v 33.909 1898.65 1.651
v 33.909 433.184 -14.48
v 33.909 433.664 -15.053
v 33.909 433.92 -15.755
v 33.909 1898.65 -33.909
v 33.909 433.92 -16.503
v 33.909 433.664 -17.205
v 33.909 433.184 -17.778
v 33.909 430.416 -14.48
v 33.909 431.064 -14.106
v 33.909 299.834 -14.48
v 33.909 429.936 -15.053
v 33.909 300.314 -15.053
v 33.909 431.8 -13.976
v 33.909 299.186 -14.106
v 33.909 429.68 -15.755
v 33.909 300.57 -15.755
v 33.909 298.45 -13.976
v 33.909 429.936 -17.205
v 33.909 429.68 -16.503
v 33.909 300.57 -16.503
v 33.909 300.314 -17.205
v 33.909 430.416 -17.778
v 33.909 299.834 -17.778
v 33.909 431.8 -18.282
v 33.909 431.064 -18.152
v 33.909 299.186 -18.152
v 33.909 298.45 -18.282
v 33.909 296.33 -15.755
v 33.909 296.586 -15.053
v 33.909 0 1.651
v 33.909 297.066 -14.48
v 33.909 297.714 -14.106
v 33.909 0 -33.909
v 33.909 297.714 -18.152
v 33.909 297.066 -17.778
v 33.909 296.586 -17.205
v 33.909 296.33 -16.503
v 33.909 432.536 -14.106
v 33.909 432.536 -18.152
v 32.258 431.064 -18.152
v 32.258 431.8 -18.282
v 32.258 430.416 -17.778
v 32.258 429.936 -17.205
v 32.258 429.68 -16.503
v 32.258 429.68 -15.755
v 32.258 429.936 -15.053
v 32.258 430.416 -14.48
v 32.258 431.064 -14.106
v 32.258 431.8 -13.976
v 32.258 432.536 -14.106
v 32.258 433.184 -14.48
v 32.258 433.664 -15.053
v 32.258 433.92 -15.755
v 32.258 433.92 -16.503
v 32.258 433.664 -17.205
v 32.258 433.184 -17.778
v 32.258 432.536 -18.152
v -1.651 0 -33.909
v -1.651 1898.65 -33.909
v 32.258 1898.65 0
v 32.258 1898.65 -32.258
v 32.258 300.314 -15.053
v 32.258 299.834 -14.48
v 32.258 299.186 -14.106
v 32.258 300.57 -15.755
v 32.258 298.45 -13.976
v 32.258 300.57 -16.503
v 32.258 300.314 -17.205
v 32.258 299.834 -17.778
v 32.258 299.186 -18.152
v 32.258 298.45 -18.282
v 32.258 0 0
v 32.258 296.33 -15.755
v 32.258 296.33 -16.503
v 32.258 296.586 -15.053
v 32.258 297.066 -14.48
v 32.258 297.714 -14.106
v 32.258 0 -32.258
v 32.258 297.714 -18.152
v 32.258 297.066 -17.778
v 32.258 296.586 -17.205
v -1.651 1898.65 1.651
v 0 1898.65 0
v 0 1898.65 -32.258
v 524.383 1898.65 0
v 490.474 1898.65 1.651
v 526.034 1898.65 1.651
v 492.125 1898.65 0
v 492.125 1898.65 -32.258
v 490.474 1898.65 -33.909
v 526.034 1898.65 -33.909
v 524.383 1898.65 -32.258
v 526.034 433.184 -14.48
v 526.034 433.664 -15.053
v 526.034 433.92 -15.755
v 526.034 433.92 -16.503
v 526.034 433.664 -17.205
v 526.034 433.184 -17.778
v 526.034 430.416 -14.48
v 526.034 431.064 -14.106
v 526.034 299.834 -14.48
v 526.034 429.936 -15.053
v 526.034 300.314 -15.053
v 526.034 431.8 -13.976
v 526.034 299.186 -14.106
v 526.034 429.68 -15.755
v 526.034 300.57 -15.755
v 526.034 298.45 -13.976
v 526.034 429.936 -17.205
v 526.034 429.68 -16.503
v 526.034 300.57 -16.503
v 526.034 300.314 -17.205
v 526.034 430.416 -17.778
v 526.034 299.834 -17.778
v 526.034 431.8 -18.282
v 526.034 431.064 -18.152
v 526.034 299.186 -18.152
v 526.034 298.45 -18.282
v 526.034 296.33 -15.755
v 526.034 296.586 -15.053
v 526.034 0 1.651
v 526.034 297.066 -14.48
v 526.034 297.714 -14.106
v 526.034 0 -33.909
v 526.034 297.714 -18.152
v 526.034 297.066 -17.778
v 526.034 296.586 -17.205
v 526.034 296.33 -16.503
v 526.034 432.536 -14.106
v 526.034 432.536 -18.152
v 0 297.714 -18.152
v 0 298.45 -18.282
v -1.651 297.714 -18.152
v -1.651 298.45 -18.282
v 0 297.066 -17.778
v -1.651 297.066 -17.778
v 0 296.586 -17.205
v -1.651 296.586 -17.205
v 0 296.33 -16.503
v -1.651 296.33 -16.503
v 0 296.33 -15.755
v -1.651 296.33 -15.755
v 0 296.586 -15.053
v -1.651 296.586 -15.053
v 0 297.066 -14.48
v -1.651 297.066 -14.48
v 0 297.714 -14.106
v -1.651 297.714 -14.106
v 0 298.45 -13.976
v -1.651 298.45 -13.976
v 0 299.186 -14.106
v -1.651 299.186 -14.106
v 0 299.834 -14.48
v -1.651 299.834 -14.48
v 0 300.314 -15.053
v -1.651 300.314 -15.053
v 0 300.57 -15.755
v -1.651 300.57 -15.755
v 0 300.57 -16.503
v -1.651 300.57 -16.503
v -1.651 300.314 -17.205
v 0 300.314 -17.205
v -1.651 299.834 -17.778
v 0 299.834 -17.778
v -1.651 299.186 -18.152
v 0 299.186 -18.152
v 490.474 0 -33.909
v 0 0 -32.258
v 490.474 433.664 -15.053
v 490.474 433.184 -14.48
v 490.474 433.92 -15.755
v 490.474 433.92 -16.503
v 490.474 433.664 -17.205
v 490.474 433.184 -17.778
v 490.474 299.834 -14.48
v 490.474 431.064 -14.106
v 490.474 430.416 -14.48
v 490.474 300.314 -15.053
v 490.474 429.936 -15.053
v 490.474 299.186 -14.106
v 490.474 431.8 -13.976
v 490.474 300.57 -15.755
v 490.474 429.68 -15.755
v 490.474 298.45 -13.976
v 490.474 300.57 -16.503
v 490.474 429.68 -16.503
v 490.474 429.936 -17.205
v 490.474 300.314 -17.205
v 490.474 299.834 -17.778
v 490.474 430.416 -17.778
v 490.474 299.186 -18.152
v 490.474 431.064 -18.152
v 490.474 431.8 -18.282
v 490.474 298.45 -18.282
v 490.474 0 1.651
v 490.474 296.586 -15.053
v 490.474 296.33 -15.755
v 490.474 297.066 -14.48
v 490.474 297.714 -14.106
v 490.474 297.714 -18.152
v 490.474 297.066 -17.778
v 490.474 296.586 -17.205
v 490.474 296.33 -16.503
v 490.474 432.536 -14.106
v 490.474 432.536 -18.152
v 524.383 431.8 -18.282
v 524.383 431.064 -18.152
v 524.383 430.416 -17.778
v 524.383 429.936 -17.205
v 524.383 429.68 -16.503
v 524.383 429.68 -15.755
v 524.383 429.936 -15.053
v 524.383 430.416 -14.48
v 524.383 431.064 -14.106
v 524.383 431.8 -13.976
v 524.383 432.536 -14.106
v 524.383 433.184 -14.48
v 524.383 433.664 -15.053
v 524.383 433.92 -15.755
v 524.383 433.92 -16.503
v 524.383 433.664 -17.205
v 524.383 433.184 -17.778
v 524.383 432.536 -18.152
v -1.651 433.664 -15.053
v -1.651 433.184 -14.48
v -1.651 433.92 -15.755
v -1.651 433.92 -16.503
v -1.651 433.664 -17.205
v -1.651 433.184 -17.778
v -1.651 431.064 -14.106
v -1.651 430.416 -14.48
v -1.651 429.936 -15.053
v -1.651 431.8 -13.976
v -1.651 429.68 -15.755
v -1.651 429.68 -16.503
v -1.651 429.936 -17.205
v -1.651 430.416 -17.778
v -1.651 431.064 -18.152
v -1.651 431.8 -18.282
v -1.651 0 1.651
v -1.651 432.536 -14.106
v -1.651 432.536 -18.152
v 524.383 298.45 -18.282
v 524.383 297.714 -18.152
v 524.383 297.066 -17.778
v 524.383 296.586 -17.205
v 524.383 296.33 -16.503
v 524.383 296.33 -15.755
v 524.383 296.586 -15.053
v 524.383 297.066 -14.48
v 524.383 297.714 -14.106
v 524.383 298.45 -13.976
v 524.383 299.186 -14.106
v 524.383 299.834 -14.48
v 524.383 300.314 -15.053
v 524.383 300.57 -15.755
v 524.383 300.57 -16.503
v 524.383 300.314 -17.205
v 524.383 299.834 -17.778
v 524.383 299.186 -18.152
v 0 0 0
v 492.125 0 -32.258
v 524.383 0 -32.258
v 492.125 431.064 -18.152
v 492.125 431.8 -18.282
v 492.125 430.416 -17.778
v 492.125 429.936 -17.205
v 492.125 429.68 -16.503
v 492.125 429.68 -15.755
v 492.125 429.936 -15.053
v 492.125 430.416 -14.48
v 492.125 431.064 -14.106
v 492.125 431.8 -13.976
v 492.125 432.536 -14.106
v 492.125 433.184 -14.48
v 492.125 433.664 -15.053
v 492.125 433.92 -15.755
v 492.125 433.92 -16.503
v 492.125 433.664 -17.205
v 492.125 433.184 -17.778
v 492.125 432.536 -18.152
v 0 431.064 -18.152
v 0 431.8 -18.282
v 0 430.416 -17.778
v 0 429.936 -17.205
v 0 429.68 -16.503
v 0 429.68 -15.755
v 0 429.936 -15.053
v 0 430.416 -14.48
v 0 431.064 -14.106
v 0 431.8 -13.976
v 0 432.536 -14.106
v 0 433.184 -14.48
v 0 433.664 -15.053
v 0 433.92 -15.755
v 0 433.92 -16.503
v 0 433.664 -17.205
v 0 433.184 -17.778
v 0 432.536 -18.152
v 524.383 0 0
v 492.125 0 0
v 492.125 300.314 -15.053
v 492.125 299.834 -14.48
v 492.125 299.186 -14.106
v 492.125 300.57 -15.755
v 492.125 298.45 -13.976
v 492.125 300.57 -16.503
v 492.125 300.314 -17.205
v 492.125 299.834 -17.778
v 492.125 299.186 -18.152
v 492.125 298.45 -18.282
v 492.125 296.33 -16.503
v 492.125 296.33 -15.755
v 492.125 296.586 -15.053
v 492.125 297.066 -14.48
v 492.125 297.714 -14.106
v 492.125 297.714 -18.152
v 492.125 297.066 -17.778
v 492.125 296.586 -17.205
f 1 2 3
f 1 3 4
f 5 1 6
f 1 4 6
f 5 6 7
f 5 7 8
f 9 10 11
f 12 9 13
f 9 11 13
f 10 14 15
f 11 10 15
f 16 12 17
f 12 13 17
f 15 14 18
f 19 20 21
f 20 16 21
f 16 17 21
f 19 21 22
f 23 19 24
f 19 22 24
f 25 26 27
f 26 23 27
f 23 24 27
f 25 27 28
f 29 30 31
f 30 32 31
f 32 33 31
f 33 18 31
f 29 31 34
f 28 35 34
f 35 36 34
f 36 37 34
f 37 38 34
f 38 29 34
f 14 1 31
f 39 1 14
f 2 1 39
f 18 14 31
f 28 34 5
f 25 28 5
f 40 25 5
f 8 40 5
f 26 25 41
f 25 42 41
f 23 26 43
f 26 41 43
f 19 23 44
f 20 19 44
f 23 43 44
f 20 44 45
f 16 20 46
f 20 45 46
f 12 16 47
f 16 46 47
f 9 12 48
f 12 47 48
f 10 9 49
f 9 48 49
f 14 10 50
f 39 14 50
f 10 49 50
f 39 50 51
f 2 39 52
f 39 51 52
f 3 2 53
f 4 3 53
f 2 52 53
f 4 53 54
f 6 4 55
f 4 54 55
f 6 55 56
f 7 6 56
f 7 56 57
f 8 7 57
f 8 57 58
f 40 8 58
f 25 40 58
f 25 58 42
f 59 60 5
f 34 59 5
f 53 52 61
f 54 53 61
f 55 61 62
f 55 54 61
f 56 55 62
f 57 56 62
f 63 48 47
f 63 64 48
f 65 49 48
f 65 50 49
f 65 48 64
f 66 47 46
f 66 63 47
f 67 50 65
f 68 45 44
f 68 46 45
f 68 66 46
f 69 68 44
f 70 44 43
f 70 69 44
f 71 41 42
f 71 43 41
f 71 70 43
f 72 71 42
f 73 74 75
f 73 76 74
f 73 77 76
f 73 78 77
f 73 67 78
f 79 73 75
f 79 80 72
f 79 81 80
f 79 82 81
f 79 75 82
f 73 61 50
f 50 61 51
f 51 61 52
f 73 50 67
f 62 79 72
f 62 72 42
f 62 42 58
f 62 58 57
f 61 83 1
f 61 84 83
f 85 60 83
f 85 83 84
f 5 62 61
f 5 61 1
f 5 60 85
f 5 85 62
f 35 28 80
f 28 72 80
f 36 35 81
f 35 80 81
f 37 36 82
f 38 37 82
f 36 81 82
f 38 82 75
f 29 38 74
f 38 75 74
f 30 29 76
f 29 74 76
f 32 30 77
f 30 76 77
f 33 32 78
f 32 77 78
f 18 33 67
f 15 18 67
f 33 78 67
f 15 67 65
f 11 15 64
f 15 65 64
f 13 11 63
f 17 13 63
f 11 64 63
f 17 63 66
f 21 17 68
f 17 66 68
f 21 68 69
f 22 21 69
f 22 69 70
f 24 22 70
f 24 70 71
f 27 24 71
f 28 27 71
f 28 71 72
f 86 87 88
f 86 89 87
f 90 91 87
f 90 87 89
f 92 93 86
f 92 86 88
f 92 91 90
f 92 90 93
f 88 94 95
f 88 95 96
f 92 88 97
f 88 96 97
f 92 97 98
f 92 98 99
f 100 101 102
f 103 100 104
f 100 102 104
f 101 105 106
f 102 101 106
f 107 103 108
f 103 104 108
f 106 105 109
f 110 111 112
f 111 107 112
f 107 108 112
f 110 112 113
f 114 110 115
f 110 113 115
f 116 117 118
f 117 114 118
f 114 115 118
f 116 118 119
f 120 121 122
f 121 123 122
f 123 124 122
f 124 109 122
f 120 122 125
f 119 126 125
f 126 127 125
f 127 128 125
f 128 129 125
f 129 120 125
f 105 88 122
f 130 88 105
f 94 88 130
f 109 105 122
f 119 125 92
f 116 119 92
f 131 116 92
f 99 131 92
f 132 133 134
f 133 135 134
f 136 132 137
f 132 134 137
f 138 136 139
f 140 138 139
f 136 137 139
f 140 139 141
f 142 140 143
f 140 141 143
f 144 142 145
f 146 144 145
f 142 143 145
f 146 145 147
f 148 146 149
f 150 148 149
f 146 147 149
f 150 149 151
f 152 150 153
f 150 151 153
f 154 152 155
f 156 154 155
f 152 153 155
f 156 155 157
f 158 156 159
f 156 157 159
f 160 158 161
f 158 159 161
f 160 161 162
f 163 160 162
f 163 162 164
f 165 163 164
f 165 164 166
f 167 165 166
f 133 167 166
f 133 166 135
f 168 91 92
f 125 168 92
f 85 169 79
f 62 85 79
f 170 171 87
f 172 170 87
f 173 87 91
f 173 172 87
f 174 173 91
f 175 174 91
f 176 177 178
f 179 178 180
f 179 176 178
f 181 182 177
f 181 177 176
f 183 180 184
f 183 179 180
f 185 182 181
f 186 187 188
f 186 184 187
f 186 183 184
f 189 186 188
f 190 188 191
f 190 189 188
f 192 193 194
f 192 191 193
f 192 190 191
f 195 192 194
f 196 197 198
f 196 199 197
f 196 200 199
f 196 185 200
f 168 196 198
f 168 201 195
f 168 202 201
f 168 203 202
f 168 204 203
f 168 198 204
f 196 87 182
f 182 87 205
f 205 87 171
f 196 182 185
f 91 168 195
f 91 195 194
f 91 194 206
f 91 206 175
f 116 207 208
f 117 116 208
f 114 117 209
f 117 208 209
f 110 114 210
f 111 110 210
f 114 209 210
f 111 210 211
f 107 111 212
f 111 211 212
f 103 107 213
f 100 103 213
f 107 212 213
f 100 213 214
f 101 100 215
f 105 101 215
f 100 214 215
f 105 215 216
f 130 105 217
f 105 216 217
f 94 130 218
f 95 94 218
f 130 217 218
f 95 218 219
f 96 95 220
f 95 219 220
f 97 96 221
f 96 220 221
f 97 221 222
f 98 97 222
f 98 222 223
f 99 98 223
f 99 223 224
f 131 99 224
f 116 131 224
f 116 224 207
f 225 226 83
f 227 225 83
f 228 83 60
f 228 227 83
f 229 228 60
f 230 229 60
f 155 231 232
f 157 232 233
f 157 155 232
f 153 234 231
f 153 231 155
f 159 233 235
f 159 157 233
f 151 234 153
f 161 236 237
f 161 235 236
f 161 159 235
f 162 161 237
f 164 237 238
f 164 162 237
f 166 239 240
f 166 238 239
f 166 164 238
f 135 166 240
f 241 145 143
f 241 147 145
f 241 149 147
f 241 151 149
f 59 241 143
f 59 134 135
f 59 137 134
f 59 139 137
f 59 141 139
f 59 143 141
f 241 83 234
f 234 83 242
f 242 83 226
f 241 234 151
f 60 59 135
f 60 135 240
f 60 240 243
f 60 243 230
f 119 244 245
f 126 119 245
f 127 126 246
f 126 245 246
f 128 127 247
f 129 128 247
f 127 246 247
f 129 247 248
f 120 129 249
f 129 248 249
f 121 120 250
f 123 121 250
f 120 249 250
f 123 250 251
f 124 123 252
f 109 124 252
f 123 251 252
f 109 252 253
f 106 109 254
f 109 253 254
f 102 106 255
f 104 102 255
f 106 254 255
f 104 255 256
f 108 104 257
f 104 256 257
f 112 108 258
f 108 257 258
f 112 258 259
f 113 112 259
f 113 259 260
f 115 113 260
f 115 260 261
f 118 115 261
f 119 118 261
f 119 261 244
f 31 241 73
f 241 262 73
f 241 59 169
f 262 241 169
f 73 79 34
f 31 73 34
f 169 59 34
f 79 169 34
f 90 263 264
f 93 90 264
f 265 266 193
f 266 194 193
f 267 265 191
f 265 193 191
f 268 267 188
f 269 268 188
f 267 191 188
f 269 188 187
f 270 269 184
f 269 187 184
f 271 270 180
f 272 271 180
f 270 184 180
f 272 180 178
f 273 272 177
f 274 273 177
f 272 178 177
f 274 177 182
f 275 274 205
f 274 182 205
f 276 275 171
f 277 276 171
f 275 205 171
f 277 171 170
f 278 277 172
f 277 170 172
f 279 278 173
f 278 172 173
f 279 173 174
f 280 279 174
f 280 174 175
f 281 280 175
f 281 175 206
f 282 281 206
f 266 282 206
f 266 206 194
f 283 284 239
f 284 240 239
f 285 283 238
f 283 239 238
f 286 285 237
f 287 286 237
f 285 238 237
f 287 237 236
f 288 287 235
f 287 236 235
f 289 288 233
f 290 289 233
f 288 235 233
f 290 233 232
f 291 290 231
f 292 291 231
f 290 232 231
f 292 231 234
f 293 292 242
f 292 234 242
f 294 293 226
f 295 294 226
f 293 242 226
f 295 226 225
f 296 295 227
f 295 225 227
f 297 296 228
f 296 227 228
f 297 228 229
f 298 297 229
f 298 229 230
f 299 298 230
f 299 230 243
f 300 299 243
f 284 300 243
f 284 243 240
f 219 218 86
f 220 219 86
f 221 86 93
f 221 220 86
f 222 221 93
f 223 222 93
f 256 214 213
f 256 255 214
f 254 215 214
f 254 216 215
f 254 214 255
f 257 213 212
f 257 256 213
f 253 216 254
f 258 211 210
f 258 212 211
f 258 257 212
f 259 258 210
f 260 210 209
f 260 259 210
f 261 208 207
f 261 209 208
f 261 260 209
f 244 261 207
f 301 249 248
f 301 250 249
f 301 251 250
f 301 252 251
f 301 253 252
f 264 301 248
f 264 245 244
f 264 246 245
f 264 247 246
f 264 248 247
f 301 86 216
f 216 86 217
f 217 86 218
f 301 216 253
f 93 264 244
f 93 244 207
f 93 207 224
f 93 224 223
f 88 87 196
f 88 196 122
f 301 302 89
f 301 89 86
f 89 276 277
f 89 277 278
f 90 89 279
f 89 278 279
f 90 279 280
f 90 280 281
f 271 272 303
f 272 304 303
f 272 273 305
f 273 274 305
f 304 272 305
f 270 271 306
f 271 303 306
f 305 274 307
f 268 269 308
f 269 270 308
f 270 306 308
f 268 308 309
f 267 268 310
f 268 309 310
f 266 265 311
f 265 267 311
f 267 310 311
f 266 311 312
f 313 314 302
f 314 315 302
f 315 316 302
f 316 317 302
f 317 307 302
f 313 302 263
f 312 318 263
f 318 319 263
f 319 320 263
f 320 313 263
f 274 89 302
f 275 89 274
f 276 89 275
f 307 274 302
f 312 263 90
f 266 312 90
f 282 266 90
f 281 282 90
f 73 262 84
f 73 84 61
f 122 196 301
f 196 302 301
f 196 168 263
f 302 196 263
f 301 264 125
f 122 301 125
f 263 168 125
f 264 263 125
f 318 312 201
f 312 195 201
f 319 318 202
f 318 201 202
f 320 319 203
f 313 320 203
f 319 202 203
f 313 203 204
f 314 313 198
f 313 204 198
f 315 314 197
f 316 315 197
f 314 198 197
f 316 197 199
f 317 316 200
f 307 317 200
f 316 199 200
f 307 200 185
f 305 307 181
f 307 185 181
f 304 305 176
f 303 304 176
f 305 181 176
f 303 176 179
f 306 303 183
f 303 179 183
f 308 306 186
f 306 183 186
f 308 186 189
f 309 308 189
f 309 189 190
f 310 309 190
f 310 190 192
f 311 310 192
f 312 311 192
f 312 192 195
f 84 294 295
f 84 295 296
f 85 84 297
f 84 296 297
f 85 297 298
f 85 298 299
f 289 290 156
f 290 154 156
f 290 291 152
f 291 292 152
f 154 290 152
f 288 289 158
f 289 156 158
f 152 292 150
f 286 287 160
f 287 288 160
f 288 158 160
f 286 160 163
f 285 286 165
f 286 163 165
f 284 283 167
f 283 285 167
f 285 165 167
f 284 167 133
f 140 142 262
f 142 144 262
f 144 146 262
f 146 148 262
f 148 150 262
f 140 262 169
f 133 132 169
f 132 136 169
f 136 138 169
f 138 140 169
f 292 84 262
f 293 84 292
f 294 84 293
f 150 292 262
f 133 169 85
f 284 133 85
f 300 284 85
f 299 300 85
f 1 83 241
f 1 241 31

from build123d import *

# Parameters (mm, degrees)
SKETCH1_W                      = 35.56
SKETCH1_H                      = 35.56
SKETCH1_W_2                    = 32.258
SKETCH1_H_2                    = 32.258
BOSS_EXTRUDE1_DEPTH            = 1898.65
BOSS_EXTRUDE1_2_DEPTH          = 1898.65
SKETCH4_W                      = 2.15265
SKETCH4_H                      = 527.685
F_8_CLEARANCE_HOLE1_AT_2_COUNT = 2
F_8_CLEARANCE_HOLE1_AT_2_PITCH = 133.35


with BuildPart() as part:
    # Sketch1 → Boss-Extrude1 (new body)
    with BuildSketch(Plane(origin=(0, 0, 0), x_dir=(1, 0, 0), z_dir=(0, 1, 0))):
        with Locations((16.129, 16.129)):
            Rectangle(SKETCH1_W, SKETCH1_H)
        with Locations((16.129, 16.129)):
            Rectangle(SKETCH1_W_2, SKETCH1_H_2, mode=Mode.SUBTRACT)
    extrude(amount=BOSS_EXTRUDE1_DEPTH)


with BuildPart() as body_2:
    # Sketch1 → Boss-Extrude1 2 (new body)
    with BuildSketch(Plane(origin=(0, 0, 0), x_dir=(1, 0, 0), z_dir=(0, 1, 0))):
        with Locations((508.254, 16.129)):
            Rectangle(SKETCH1_W, SKETCH1_H)
        with Locations((508.254, 16.129)):
            Rectangle(SKETCH1_W_2, SKETCH1_H_2, mode=Mode.SUBTRACT)
    extrude(amount=BOSS_EXTRUDE1_2_DEPTH)


with BuildPart() as f_8_clearance_hole1_tool:
    # Sketch4 → #8 Clearance Hole1 (revolve)
    with BuildSketch(Plane(origin=(526.034, 298.45, -16.129), x_dir=(0, 0, -1), z_dir=(0, 1, 0))):
        with Locations((1.076325, 263.8425)):
            Rectangle(SKETCH4_W, SKETCH4_H)
    f_8_clearance_hole1 = revolve(axis=Axis((532.384, 298.45, -16.129), (-1, 0, 0)))


with BuildPart() as part_1:
    add(part.part)

    # #8 Clearance Hole1: cut by f_8_clearance_hole1_tool
    add(f_8_clearance_hole1_tool.part, mode=Mode.SUBTRACT)


with BuildPart() as body_2_1:
    add(body_2.part)

    # #8 Clearance Hole1: cut by f_8_clearance_hole1_tool
    add(f_8_clearance_hole1_tool.part, mode=Mode.SUBTRACT)


with BuildPart() as f_8_clearance_hole1_at_2_tool:
    # #8 Clearance Hole1 at 2: #8 Clearance Hole1 ×2
    with Locations(*[(0, i * F_8_CLEARANCE_HOLE1_AT_2_PITCH, 0) for i in range(1, F_8_CLEARANCE_HOLE1_AT_2_COUNT)]):
        add(f_8_clearance_hole1)


with BuildPart() as part_2:
    add(part_1.part)

    # #8 Clearance Hole1 at 2: cut by f_8_clearance_hole1_at_2_tool
    add(f_8_clearance_hole1_at_2_tool.part, mode=Mode.SUBTRACT)


with BuildPart() as body_2_2:
    add(body_2_1.part)

    # #8 Clearance Hole1 at 2: cut by f_8_clearance_hole1_at_2_tool
    add(f_8_clearance_hole1_at_2_tool.part, mode=Mode.SUBTRACT)


solid = Compound([part_2.part, body_2_2.part])
